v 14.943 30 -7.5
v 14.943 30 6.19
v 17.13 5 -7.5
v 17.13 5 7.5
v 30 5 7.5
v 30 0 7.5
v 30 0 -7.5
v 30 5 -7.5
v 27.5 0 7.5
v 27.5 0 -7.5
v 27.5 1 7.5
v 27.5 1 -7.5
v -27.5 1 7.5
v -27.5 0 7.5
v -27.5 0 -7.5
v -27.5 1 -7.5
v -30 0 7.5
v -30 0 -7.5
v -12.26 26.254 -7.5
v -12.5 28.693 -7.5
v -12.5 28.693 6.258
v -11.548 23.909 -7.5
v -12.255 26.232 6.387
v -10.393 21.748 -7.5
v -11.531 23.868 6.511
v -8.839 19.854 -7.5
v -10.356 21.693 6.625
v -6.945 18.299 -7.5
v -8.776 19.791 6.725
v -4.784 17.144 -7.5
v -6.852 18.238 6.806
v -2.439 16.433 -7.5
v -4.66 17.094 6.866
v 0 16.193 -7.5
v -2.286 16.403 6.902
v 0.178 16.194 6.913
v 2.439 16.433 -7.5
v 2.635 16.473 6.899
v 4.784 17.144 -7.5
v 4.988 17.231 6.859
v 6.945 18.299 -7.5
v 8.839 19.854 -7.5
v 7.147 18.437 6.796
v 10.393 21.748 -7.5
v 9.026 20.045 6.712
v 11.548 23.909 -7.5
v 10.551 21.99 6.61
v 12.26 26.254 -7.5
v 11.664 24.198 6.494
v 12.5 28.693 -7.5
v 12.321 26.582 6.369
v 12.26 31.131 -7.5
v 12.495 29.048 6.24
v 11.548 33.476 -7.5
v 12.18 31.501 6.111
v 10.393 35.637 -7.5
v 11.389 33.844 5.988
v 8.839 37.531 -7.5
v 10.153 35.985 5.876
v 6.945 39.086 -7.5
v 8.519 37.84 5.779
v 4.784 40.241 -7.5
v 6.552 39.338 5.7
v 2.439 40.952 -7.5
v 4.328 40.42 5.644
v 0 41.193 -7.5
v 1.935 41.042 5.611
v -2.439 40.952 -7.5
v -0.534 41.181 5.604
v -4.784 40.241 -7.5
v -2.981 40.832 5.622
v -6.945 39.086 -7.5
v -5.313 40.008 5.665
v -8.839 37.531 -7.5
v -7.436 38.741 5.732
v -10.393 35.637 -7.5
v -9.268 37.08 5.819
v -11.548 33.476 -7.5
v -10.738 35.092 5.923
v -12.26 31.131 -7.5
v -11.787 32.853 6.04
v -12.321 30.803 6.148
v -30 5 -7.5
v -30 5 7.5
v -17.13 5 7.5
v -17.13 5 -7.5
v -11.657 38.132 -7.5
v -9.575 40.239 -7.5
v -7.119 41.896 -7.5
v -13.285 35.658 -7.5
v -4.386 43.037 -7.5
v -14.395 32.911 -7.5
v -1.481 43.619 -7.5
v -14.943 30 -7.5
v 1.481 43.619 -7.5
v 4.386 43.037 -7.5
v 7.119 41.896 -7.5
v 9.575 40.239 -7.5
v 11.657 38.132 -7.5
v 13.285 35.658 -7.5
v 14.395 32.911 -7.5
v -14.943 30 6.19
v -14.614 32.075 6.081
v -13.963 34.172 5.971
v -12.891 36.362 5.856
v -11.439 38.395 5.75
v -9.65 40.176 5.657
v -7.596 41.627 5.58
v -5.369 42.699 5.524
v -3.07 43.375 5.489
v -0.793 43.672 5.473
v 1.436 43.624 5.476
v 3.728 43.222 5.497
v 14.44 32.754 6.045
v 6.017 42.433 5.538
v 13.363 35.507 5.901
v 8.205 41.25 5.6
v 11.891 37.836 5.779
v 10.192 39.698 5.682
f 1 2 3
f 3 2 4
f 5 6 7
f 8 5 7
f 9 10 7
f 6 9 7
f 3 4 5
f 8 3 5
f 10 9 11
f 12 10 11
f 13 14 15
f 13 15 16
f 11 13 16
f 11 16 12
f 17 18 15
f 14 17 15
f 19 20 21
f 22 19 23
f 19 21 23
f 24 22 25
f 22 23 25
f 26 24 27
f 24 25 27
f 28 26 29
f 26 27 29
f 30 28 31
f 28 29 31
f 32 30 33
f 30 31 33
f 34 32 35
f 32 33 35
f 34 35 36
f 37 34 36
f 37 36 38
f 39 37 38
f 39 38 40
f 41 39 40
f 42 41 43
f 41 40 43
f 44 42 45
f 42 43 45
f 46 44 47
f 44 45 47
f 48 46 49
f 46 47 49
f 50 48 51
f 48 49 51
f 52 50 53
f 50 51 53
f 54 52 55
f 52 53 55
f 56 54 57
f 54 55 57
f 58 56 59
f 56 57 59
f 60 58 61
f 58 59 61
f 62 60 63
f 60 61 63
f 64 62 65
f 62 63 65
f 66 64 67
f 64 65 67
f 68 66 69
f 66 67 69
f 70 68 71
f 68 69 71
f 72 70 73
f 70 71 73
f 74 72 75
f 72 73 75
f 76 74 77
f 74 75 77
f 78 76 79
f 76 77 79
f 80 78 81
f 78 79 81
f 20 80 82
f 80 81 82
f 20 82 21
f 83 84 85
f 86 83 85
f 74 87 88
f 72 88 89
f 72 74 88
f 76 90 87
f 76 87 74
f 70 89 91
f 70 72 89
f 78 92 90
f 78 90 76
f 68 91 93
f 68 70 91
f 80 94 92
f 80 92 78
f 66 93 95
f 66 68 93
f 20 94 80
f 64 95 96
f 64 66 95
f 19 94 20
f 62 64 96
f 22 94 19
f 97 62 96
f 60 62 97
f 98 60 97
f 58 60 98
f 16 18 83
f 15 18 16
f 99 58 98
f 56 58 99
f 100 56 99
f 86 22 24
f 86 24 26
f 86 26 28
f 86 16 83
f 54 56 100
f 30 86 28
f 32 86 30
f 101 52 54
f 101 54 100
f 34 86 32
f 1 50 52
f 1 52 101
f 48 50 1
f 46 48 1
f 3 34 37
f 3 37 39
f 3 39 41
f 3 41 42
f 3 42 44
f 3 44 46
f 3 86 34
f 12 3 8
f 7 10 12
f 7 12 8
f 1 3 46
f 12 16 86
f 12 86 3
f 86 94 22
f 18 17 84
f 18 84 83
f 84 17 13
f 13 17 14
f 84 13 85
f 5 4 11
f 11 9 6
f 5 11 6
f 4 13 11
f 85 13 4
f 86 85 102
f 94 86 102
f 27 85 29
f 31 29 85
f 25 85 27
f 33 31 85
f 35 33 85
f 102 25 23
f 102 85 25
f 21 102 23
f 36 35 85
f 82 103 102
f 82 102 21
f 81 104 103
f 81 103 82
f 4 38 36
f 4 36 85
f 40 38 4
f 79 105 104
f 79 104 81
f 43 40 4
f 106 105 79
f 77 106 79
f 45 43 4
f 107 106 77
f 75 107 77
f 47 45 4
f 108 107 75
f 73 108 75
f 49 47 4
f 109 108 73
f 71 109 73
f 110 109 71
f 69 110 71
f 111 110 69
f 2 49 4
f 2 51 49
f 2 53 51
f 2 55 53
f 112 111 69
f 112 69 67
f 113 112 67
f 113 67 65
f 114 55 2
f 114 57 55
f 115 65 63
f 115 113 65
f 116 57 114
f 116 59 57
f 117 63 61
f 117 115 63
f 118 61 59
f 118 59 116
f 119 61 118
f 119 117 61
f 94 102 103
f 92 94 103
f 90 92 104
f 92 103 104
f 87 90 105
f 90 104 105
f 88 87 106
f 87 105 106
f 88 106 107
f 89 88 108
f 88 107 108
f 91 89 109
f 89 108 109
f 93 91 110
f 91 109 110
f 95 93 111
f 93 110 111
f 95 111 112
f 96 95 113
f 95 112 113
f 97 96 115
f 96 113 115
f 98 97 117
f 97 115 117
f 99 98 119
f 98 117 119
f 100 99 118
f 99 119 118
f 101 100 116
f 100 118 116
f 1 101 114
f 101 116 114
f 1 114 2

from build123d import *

# Parameters (mm, degrees)
SKETCH1_W                       = 60
SKETCH1_H                       = 15
BOSS_EXTRUDE1_DEPTH             = 5
BOSS_EXTRUDE2_REACH             = 33.325
SKETCH2_R                       = 12.5
BOSS_EXTRUDE2_DIRECTION_2_REACH = 33.325
SKETCH3_W                       = 55
SKETCH3_H                       = 2
CUT_EXTRUDE1_DEPTH              = 56.082201073
DRAFT1_START                    = 7.751401292
DRAFT1_DEPTH                    = 3.248598708


with BuildPart() as part:
    # Sketch1 → Boss-Extrude1 (new body)
    with BuildSketch(Plane(origin=(0, 0, 0), x_dir=(1, 0, 0), z_dir=(0, 1, 0))):
        Rectangle(SKETCH1_W, SKETCH1_H)
    extrude(amount=BOSS_EXTRUDE1_DEPTH)

    # Boss-Extrude2: up to this face of the body (flat: up to its plane)
    boss_extrude2_end = Plane(part.part.faces().sort_by_distance((0, 2.5, 7.5))[0])
    # Sketch2 → Boss-Extrude2 (add, up to the picked face)
    with BuildSketch(Plane.XY, mode=Mode.PRIVATE) as boss_extrude2_sk1:
        with BuildLine():
            Line((-17.13013706, 5), (-14.942920471, 30))
            ThreePointArc((-14.942920471, 30), (0, 43.692663859), (14.942920471, 30))
            Line((14.942920471, 30), (17.13013706, 5))
            Line((17.13013706, 5), (-17.13013706, 5))
        make_face()
        with Locations(Location((0, 28.692663859, 0), (0, 0, 180))):
            Circle(SKETCH2_R, mode=Mode.SUBTRACT)
    boss_extrude2_tool1 = split(extrude(boss_extrude2_sk1.sketch, amount=BOSS_EXTRUDE2_REACH, mode=Mode.PRIVATE), bisect_by=boss_extrude2_end, keep=Keep.BOTH, mode=Mode.PRIVATE)
    add(boss_extrude2_tool1.solids().sort_by(Axis((15.521689, 17.454957, 0), (0, 0, 1)))[0])

    # Boss-Extrude2 direction 2: up to this face of the body (flat: up to its plane)
    boss_extrude2_direction_2_end = Plane(part.part.faces().sort_by_distance((0, 2.5, -7.5))[0])
    # Sketch2 → Boss-Extrude2 direction 2 (add, up to the picked face)
    with BuildSketch(Plane.XY, mode=Mode.PRIVATE) as boss_extrude2_direction_2_sk1:
        with BuildLine():
            Line((-17.13013706, 5), (-14.942920471, 30))
            ThreePointArc((-14.942920471, 30), (0, 43.692663859), (14.942920471, 30))
            Line((14.942920471, 30), (17.13013706, 5))
            Line((17.13013706, 5), (-17.13013706, 5))
        make_face()
        with Locations(Location((0, 28.692663859, 0), (0, 0, 180))):
            Circle(SKETCH2_R, mode=Mode.SUBTRACT)
    boss_extrude2_direction_2_tool1 = split(extrude(boss_extrude2_direction_2_sk1.sketch, amount=-BOSS_EXTRUDE2_DIRECTION_2_REACH, mode=Mode.PRIVATE), bisect_by=boss_extrude2_direction_2_end, keep=Keep.BOTH, mode=Mode.PRIVATE)
    add(boss_extrude2_direction_2_tool1.solids().sort_by(Axis((15.521689, 17.454957, 0), (0, 0, -1)))[0])

    # Sketch3 → Cut-Extrude1 (cut, through all)
    with BuildSketch(Plane.XY.offset(7.5)):
        Rectangle(SKETCH3_W, SKETCH3_H)
    extrude(amount=-CUT_EXTRUDE1_DEPTH, mode=Mode.SUBTRACT)

    # Draft1: read off the stored shape, not the designer's step
    # Draft1 outline → Draft1 (cut)
    with BuildSketch(Plane(origin=(0, 0, 0), x_dir=(1, 0, 0), z_dir=(0, 0.05233595624294388, 0.9986295347545738)).offset(DRAFT1_START)):
        with BuildLine():
            add(Edge.make_bspline(
                [(14.942920471, 29.634936652), (13.74496761, 43.346391583), (0, 43.346391583), (-13.74496761, 43.346391583), (-14.942920471, 29.634936652)],
                knots=[4.799655443, 4.799655443, 4.799655443, 6.283185307, 6.283185307, 7.766715171, 7.766715171, 7.766715171], degree=2, weights=[1, 0.737277337, 1, 0.737277337, 1]))
            Line((-14.942920471, 29.634936652), (-17.13013706, 4.600628002))
            Line((-17.13013706, 4.600628002), (17.13013706, 4.600628002))
            Line((17.13013706, 4.600628002), (14.942920471, 29.634936652))
        make_face()
    extrude(amount=DRAFT1_DEPTH, mode=Mode.SUBTRACT)


solid = part.part
